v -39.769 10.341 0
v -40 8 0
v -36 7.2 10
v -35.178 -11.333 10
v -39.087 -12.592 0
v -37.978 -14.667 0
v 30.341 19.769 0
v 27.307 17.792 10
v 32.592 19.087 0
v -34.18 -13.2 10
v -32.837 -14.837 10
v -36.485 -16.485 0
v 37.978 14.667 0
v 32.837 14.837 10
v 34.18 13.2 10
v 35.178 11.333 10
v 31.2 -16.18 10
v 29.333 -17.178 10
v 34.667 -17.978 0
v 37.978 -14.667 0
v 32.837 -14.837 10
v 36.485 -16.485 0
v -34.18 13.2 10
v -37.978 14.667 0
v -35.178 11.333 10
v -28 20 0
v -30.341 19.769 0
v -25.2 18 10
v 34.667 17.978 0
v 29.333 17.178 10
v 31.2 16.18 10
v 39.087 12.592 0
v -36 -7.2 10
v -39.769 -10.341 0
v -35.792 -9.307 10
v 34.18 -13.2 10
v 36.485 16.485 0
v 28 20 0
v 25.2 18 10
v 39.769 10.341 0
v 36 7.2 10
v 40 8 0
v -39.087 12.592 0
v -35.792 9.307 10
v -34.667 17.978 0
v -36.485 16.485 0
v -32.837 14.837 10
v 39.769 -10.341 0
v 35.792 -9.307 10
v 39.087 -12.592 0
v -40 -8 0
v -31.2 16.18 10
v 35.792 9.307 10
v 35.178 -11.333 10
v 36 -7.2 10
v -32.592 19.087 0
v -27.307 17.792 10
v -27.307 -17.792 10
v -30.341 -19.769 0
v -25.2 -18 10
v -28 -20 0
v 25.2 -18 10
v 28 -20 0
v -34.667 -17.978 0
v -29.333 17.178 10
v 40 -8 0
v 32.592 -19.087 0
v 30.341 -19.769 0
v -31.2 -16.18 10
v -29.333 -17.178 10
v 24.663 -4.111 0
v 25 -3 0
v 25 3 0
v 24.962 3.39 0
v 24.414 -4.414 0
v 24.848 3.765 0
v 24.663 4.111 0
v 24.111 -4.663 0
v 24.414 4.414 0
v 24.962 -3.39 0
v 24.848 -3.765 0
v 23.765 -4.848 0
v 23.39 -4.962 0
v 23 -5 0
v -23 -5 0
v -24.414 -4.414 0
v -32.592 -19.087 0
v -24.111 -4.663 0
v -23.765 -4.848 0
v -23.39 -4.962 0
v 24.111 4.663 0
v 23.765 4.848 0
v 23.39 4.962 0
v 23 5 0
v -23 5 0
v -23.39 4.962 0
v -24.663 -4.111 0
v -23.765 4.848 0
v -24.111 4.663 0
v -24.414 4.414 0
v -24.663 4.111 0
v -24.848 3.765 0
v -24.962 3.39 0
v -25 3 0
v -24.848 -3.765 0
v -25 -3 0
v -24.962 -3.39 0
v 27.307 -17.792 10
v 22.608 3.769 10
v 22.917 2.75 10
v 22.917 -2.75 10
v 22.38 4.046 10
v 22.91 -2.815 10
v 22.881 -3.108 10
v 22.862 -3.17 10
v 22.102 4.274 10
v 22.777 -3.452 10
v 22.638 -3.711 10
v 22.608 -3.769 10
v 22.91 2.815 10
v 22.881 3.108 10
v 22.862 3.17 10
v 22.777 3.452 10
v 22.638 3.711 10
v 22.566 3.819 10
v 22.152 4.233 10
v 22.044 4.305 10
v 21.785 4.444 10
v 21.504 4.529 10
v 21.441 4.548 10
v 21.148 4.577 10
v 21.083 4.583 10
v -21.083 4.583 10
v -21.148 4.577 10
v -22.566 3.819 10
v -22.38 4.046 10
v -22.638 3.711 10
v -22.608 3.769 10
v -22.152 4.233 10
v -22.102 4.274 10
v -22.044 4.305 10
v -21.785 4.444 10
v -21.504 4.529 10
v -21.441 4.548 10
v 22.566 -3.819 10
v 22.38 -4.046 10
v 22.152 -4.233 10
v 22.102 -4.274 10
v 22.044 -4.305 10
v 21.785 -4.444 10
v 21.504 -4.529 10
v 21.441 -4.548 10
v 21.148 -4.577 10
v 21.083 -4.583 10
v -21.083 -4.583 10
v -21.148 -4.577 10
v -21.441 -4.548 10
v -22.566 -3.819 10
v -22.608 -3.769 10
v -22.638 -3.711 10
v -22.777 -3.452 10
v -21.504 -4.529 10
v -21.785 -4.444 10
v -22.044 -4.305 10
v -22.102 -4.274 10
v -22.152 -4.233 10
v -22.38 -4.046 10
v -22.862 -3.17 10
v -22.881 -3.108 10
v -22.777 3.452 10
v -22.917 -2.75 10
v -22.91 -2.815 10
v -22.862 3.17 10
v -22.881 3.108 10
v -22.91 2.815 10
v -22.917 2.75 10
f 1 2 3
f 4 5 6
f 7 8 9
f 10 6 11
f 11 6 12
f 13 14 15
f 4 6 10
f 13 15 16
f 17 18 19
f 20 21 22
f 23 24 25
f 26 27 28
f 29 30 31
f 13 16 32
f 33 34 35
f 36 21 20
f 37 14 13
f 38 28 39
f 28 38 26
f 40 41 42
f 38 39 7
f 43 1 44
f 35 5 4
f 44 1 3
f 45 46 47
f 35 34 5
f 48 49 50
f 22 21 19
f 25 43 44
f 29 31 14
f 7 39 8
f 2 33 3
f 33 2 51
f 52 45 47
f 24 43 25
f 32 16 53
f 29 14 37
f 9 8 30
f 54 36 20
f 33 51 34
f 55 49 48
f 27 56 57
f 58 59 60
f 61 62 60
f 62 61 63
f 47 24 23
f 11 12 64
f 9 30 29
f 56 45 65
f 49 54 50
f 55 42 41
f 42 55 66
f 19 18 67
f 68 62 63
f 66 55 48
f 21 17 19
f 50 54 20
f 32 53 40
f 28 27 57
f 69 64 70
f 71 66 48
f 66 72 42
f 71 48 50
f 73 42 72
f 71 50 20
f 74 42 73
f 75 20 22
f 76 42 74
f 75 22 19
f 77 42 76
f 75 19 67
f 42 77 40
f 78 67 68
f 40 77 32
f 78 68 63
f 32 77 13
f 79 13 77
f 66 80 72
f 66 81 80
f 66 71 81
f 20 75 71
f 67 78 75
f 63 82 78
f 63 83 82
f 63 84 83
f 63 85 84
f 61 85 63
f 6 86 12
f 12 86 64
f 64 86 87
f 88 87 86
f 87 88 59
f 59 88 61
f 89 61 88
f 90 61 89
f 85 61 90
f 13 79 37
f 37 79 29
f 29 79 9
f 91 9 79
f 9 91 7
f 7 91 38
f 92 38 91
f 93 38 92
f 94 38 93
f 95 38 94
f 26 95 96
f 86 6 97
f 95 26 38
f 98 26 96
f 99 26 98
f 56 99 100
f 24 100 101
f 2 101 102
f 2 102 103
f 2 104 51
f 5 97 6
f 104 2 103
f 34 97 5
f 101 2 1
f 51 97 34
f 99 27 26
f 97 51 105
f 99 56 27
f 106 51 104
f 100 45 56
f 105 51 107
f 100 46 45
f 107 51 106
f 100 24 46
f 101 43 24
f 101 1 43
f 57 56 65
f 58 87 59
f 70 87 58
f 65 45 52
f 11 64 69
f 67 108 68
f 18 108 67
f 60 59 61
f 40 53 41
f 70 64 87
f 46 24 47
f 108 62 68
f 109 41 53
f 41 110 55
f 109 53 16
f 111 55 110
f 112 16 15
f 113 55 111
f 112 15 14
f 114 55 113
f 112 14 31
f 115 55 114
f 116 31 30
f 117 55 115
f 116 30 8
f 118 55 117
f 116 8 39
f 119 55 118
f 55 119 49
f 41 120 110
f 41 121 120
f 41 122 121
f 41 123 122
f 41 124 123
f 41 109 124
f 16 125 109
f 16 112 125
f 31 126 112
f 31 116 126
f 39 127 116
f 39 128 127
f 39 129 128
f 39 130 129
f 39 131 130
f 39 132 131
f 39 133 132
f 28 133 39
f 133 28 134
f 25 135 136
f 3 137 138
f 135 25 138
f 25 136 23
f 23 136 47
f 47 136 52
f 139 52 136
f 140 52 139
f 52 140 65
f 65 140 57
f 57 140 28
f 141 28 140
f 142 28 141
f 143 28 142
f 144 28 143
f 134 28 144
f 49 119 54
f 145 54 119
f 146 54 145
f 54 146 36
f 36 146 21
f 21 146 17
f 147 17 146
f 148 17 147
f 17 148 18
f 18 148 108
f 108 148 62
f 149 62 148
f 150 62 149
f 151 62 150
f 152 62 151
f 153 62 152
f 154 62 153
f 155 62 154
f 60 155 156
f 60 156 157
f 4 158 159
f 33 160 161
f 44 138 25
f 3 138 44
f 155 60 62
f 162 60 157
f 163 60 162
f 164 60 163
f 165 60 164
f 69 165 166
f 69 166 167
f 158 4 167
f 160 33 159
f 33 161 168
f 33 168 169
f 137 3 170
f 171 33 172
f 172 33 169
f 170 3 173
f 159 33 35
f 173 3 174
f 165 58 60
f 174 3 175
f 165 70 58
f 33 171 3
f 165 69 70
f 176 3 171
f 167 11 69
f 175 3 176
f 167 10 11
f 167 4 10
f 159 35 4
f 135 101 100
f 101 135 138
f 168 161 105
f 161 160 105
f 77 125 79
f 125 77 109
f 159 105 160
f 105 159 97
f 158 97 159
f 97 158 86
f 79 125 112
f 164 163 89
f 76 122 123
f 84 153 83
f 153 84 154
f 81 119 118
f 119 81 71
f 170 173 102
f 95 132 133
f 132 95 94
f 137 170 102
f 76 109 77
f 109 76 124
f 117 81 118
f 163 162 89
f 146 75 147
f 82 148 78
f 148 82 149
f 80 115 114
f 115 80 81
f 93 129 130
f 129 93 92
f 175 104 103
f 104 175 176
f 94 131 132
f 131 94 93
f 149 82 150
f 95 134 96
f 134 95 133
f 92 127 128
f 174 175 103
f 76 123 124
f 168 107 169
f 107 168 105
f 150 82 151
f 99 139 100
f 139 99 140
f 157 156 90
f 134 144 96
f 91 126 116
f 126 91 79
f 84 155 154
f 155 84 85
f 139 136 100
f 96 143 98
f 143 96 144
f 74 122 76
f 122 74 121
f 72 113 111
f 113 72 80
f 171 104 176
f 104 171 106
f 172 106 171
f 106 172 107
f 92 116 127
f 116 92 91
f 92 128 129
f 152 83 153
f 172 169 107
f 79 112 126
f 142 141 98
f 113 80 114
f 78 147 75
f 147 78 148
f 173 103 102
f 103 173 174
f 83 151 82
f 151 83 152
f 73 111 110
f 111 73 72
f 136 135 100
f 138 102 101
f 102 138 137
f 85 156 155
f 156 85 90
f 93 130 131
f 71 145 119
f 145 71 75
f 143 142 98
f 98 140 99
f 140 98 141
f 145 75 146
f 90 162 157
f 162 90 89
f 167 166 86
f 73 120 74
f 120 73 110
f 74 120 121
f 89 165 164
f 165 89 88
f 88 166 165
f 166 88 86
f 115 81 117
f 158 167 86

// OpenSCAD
$fn = 32;

// ----------------------------------------------------------------------
// Display bezel: 80 x 40 mm frame, opening 50x10 mm
// ----------------------------------------------------------------------

// --- parameters (mm) ---
length = 80;              // frame outside length, X
width = 40;               // frame outside width, Y
frame_w = 15;             // frame width
thickness = 10;           // frame thickness
corner_r = 12;            // outside corner radius
chamfer = 0.9;            // outer wall taper
funnel = 0.9;             // inner opening taper
opening_l = 50;           // opening length
opening_w = 10;           // opening width
inner_r = 2;              // opening corner radius

/* rounded-rectangle outlines, generated with loops */
module rounded_ring(l_nom, w_nom, r) {
  hull() {
    for (sx = [-1, 1]) for (sy = [-1, 1])
      translate([sx * (l_nom / 2 - r), sy * (w_nom / 2 - r)]) circle(r = r);
  }
}

difference() {
  /* frame body, drafted so the outer edge is a variable-depth chamfer */
  linear_extrude(height = thickness, scale = chamfer)
    rounded_ring(length, width, corner_r);
  /* viewing opening, drafted the other way for a funnel edge */
  linear_extrude(height = thickness + 2, scale = funnel)
    translate([0, 0, -1]) rounded_ring(opening_l, opening_w, inner_r);
}
